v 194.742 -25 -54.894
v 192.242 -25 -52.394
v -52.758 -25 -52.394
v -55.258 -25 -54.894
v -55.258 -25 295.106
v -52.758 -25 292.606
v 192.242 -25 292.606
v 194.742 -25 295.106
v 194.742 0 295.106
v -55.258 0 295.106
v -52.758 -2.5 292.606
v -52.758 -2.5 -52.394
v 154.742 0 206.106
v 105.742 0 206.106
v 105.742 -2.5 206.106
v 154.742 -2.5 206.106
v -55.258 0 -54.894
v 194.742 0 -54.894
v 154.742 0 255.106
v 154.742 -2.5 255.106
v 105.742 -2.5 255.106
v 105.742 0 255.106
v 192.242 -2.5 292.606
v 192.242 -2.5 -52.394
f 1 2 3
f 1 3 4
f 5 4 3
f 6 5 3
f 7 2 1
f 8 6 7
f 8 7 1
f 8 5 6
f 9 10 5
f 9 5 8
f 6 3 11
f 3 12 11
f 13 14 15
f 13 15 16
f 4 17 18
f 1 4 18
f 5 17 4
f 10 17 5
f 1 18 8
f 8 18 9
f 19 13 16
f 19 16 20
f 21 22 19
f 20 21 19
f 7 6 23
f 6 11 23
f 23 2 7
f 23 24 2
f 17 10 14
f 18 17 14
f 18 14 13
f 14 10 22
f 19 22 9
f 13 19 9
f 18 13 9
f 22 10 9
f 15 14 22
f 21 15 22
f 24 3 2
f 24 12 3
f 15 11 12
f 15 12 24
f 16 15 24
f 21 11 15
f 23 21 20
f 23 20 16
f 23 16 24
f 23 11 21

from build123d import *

# Parameters (mm, degrees)
F0_W     = 250
F0_H     = 350
F1_DEPTH = 25
F2_T     = -2.5
F3_W     = 49
F3_H     = 49
F4_DEPTH = 25


with BuildPart() as f1:
    # F0 (on Front) → F1 (new body)
    with BuildSketch(Plane.XZ):
        with Locations((69.741823, 120.105962)):
            Rectangle(F0_W, F0_H)
    extrude(amount=F1_DEPTH)

    # F2
    f2_openings = [f1.faces().sort_by_distance(p)[0] for p in [
        (69.741823, -25, 120.105962),
    ]]
    offset(amount=F2_T, openings=f2_openings)

    # F3 (on face) → F4 (cut)
    with BuildSketch(Plane.XZ):
        with Locations((130.241823, 230.605962)):
            Rectangle(F3_W, F3_H)
    extrude(amount=F4_DEPTH, mode=Mode.SUBTRACT)


solid = f1.part
